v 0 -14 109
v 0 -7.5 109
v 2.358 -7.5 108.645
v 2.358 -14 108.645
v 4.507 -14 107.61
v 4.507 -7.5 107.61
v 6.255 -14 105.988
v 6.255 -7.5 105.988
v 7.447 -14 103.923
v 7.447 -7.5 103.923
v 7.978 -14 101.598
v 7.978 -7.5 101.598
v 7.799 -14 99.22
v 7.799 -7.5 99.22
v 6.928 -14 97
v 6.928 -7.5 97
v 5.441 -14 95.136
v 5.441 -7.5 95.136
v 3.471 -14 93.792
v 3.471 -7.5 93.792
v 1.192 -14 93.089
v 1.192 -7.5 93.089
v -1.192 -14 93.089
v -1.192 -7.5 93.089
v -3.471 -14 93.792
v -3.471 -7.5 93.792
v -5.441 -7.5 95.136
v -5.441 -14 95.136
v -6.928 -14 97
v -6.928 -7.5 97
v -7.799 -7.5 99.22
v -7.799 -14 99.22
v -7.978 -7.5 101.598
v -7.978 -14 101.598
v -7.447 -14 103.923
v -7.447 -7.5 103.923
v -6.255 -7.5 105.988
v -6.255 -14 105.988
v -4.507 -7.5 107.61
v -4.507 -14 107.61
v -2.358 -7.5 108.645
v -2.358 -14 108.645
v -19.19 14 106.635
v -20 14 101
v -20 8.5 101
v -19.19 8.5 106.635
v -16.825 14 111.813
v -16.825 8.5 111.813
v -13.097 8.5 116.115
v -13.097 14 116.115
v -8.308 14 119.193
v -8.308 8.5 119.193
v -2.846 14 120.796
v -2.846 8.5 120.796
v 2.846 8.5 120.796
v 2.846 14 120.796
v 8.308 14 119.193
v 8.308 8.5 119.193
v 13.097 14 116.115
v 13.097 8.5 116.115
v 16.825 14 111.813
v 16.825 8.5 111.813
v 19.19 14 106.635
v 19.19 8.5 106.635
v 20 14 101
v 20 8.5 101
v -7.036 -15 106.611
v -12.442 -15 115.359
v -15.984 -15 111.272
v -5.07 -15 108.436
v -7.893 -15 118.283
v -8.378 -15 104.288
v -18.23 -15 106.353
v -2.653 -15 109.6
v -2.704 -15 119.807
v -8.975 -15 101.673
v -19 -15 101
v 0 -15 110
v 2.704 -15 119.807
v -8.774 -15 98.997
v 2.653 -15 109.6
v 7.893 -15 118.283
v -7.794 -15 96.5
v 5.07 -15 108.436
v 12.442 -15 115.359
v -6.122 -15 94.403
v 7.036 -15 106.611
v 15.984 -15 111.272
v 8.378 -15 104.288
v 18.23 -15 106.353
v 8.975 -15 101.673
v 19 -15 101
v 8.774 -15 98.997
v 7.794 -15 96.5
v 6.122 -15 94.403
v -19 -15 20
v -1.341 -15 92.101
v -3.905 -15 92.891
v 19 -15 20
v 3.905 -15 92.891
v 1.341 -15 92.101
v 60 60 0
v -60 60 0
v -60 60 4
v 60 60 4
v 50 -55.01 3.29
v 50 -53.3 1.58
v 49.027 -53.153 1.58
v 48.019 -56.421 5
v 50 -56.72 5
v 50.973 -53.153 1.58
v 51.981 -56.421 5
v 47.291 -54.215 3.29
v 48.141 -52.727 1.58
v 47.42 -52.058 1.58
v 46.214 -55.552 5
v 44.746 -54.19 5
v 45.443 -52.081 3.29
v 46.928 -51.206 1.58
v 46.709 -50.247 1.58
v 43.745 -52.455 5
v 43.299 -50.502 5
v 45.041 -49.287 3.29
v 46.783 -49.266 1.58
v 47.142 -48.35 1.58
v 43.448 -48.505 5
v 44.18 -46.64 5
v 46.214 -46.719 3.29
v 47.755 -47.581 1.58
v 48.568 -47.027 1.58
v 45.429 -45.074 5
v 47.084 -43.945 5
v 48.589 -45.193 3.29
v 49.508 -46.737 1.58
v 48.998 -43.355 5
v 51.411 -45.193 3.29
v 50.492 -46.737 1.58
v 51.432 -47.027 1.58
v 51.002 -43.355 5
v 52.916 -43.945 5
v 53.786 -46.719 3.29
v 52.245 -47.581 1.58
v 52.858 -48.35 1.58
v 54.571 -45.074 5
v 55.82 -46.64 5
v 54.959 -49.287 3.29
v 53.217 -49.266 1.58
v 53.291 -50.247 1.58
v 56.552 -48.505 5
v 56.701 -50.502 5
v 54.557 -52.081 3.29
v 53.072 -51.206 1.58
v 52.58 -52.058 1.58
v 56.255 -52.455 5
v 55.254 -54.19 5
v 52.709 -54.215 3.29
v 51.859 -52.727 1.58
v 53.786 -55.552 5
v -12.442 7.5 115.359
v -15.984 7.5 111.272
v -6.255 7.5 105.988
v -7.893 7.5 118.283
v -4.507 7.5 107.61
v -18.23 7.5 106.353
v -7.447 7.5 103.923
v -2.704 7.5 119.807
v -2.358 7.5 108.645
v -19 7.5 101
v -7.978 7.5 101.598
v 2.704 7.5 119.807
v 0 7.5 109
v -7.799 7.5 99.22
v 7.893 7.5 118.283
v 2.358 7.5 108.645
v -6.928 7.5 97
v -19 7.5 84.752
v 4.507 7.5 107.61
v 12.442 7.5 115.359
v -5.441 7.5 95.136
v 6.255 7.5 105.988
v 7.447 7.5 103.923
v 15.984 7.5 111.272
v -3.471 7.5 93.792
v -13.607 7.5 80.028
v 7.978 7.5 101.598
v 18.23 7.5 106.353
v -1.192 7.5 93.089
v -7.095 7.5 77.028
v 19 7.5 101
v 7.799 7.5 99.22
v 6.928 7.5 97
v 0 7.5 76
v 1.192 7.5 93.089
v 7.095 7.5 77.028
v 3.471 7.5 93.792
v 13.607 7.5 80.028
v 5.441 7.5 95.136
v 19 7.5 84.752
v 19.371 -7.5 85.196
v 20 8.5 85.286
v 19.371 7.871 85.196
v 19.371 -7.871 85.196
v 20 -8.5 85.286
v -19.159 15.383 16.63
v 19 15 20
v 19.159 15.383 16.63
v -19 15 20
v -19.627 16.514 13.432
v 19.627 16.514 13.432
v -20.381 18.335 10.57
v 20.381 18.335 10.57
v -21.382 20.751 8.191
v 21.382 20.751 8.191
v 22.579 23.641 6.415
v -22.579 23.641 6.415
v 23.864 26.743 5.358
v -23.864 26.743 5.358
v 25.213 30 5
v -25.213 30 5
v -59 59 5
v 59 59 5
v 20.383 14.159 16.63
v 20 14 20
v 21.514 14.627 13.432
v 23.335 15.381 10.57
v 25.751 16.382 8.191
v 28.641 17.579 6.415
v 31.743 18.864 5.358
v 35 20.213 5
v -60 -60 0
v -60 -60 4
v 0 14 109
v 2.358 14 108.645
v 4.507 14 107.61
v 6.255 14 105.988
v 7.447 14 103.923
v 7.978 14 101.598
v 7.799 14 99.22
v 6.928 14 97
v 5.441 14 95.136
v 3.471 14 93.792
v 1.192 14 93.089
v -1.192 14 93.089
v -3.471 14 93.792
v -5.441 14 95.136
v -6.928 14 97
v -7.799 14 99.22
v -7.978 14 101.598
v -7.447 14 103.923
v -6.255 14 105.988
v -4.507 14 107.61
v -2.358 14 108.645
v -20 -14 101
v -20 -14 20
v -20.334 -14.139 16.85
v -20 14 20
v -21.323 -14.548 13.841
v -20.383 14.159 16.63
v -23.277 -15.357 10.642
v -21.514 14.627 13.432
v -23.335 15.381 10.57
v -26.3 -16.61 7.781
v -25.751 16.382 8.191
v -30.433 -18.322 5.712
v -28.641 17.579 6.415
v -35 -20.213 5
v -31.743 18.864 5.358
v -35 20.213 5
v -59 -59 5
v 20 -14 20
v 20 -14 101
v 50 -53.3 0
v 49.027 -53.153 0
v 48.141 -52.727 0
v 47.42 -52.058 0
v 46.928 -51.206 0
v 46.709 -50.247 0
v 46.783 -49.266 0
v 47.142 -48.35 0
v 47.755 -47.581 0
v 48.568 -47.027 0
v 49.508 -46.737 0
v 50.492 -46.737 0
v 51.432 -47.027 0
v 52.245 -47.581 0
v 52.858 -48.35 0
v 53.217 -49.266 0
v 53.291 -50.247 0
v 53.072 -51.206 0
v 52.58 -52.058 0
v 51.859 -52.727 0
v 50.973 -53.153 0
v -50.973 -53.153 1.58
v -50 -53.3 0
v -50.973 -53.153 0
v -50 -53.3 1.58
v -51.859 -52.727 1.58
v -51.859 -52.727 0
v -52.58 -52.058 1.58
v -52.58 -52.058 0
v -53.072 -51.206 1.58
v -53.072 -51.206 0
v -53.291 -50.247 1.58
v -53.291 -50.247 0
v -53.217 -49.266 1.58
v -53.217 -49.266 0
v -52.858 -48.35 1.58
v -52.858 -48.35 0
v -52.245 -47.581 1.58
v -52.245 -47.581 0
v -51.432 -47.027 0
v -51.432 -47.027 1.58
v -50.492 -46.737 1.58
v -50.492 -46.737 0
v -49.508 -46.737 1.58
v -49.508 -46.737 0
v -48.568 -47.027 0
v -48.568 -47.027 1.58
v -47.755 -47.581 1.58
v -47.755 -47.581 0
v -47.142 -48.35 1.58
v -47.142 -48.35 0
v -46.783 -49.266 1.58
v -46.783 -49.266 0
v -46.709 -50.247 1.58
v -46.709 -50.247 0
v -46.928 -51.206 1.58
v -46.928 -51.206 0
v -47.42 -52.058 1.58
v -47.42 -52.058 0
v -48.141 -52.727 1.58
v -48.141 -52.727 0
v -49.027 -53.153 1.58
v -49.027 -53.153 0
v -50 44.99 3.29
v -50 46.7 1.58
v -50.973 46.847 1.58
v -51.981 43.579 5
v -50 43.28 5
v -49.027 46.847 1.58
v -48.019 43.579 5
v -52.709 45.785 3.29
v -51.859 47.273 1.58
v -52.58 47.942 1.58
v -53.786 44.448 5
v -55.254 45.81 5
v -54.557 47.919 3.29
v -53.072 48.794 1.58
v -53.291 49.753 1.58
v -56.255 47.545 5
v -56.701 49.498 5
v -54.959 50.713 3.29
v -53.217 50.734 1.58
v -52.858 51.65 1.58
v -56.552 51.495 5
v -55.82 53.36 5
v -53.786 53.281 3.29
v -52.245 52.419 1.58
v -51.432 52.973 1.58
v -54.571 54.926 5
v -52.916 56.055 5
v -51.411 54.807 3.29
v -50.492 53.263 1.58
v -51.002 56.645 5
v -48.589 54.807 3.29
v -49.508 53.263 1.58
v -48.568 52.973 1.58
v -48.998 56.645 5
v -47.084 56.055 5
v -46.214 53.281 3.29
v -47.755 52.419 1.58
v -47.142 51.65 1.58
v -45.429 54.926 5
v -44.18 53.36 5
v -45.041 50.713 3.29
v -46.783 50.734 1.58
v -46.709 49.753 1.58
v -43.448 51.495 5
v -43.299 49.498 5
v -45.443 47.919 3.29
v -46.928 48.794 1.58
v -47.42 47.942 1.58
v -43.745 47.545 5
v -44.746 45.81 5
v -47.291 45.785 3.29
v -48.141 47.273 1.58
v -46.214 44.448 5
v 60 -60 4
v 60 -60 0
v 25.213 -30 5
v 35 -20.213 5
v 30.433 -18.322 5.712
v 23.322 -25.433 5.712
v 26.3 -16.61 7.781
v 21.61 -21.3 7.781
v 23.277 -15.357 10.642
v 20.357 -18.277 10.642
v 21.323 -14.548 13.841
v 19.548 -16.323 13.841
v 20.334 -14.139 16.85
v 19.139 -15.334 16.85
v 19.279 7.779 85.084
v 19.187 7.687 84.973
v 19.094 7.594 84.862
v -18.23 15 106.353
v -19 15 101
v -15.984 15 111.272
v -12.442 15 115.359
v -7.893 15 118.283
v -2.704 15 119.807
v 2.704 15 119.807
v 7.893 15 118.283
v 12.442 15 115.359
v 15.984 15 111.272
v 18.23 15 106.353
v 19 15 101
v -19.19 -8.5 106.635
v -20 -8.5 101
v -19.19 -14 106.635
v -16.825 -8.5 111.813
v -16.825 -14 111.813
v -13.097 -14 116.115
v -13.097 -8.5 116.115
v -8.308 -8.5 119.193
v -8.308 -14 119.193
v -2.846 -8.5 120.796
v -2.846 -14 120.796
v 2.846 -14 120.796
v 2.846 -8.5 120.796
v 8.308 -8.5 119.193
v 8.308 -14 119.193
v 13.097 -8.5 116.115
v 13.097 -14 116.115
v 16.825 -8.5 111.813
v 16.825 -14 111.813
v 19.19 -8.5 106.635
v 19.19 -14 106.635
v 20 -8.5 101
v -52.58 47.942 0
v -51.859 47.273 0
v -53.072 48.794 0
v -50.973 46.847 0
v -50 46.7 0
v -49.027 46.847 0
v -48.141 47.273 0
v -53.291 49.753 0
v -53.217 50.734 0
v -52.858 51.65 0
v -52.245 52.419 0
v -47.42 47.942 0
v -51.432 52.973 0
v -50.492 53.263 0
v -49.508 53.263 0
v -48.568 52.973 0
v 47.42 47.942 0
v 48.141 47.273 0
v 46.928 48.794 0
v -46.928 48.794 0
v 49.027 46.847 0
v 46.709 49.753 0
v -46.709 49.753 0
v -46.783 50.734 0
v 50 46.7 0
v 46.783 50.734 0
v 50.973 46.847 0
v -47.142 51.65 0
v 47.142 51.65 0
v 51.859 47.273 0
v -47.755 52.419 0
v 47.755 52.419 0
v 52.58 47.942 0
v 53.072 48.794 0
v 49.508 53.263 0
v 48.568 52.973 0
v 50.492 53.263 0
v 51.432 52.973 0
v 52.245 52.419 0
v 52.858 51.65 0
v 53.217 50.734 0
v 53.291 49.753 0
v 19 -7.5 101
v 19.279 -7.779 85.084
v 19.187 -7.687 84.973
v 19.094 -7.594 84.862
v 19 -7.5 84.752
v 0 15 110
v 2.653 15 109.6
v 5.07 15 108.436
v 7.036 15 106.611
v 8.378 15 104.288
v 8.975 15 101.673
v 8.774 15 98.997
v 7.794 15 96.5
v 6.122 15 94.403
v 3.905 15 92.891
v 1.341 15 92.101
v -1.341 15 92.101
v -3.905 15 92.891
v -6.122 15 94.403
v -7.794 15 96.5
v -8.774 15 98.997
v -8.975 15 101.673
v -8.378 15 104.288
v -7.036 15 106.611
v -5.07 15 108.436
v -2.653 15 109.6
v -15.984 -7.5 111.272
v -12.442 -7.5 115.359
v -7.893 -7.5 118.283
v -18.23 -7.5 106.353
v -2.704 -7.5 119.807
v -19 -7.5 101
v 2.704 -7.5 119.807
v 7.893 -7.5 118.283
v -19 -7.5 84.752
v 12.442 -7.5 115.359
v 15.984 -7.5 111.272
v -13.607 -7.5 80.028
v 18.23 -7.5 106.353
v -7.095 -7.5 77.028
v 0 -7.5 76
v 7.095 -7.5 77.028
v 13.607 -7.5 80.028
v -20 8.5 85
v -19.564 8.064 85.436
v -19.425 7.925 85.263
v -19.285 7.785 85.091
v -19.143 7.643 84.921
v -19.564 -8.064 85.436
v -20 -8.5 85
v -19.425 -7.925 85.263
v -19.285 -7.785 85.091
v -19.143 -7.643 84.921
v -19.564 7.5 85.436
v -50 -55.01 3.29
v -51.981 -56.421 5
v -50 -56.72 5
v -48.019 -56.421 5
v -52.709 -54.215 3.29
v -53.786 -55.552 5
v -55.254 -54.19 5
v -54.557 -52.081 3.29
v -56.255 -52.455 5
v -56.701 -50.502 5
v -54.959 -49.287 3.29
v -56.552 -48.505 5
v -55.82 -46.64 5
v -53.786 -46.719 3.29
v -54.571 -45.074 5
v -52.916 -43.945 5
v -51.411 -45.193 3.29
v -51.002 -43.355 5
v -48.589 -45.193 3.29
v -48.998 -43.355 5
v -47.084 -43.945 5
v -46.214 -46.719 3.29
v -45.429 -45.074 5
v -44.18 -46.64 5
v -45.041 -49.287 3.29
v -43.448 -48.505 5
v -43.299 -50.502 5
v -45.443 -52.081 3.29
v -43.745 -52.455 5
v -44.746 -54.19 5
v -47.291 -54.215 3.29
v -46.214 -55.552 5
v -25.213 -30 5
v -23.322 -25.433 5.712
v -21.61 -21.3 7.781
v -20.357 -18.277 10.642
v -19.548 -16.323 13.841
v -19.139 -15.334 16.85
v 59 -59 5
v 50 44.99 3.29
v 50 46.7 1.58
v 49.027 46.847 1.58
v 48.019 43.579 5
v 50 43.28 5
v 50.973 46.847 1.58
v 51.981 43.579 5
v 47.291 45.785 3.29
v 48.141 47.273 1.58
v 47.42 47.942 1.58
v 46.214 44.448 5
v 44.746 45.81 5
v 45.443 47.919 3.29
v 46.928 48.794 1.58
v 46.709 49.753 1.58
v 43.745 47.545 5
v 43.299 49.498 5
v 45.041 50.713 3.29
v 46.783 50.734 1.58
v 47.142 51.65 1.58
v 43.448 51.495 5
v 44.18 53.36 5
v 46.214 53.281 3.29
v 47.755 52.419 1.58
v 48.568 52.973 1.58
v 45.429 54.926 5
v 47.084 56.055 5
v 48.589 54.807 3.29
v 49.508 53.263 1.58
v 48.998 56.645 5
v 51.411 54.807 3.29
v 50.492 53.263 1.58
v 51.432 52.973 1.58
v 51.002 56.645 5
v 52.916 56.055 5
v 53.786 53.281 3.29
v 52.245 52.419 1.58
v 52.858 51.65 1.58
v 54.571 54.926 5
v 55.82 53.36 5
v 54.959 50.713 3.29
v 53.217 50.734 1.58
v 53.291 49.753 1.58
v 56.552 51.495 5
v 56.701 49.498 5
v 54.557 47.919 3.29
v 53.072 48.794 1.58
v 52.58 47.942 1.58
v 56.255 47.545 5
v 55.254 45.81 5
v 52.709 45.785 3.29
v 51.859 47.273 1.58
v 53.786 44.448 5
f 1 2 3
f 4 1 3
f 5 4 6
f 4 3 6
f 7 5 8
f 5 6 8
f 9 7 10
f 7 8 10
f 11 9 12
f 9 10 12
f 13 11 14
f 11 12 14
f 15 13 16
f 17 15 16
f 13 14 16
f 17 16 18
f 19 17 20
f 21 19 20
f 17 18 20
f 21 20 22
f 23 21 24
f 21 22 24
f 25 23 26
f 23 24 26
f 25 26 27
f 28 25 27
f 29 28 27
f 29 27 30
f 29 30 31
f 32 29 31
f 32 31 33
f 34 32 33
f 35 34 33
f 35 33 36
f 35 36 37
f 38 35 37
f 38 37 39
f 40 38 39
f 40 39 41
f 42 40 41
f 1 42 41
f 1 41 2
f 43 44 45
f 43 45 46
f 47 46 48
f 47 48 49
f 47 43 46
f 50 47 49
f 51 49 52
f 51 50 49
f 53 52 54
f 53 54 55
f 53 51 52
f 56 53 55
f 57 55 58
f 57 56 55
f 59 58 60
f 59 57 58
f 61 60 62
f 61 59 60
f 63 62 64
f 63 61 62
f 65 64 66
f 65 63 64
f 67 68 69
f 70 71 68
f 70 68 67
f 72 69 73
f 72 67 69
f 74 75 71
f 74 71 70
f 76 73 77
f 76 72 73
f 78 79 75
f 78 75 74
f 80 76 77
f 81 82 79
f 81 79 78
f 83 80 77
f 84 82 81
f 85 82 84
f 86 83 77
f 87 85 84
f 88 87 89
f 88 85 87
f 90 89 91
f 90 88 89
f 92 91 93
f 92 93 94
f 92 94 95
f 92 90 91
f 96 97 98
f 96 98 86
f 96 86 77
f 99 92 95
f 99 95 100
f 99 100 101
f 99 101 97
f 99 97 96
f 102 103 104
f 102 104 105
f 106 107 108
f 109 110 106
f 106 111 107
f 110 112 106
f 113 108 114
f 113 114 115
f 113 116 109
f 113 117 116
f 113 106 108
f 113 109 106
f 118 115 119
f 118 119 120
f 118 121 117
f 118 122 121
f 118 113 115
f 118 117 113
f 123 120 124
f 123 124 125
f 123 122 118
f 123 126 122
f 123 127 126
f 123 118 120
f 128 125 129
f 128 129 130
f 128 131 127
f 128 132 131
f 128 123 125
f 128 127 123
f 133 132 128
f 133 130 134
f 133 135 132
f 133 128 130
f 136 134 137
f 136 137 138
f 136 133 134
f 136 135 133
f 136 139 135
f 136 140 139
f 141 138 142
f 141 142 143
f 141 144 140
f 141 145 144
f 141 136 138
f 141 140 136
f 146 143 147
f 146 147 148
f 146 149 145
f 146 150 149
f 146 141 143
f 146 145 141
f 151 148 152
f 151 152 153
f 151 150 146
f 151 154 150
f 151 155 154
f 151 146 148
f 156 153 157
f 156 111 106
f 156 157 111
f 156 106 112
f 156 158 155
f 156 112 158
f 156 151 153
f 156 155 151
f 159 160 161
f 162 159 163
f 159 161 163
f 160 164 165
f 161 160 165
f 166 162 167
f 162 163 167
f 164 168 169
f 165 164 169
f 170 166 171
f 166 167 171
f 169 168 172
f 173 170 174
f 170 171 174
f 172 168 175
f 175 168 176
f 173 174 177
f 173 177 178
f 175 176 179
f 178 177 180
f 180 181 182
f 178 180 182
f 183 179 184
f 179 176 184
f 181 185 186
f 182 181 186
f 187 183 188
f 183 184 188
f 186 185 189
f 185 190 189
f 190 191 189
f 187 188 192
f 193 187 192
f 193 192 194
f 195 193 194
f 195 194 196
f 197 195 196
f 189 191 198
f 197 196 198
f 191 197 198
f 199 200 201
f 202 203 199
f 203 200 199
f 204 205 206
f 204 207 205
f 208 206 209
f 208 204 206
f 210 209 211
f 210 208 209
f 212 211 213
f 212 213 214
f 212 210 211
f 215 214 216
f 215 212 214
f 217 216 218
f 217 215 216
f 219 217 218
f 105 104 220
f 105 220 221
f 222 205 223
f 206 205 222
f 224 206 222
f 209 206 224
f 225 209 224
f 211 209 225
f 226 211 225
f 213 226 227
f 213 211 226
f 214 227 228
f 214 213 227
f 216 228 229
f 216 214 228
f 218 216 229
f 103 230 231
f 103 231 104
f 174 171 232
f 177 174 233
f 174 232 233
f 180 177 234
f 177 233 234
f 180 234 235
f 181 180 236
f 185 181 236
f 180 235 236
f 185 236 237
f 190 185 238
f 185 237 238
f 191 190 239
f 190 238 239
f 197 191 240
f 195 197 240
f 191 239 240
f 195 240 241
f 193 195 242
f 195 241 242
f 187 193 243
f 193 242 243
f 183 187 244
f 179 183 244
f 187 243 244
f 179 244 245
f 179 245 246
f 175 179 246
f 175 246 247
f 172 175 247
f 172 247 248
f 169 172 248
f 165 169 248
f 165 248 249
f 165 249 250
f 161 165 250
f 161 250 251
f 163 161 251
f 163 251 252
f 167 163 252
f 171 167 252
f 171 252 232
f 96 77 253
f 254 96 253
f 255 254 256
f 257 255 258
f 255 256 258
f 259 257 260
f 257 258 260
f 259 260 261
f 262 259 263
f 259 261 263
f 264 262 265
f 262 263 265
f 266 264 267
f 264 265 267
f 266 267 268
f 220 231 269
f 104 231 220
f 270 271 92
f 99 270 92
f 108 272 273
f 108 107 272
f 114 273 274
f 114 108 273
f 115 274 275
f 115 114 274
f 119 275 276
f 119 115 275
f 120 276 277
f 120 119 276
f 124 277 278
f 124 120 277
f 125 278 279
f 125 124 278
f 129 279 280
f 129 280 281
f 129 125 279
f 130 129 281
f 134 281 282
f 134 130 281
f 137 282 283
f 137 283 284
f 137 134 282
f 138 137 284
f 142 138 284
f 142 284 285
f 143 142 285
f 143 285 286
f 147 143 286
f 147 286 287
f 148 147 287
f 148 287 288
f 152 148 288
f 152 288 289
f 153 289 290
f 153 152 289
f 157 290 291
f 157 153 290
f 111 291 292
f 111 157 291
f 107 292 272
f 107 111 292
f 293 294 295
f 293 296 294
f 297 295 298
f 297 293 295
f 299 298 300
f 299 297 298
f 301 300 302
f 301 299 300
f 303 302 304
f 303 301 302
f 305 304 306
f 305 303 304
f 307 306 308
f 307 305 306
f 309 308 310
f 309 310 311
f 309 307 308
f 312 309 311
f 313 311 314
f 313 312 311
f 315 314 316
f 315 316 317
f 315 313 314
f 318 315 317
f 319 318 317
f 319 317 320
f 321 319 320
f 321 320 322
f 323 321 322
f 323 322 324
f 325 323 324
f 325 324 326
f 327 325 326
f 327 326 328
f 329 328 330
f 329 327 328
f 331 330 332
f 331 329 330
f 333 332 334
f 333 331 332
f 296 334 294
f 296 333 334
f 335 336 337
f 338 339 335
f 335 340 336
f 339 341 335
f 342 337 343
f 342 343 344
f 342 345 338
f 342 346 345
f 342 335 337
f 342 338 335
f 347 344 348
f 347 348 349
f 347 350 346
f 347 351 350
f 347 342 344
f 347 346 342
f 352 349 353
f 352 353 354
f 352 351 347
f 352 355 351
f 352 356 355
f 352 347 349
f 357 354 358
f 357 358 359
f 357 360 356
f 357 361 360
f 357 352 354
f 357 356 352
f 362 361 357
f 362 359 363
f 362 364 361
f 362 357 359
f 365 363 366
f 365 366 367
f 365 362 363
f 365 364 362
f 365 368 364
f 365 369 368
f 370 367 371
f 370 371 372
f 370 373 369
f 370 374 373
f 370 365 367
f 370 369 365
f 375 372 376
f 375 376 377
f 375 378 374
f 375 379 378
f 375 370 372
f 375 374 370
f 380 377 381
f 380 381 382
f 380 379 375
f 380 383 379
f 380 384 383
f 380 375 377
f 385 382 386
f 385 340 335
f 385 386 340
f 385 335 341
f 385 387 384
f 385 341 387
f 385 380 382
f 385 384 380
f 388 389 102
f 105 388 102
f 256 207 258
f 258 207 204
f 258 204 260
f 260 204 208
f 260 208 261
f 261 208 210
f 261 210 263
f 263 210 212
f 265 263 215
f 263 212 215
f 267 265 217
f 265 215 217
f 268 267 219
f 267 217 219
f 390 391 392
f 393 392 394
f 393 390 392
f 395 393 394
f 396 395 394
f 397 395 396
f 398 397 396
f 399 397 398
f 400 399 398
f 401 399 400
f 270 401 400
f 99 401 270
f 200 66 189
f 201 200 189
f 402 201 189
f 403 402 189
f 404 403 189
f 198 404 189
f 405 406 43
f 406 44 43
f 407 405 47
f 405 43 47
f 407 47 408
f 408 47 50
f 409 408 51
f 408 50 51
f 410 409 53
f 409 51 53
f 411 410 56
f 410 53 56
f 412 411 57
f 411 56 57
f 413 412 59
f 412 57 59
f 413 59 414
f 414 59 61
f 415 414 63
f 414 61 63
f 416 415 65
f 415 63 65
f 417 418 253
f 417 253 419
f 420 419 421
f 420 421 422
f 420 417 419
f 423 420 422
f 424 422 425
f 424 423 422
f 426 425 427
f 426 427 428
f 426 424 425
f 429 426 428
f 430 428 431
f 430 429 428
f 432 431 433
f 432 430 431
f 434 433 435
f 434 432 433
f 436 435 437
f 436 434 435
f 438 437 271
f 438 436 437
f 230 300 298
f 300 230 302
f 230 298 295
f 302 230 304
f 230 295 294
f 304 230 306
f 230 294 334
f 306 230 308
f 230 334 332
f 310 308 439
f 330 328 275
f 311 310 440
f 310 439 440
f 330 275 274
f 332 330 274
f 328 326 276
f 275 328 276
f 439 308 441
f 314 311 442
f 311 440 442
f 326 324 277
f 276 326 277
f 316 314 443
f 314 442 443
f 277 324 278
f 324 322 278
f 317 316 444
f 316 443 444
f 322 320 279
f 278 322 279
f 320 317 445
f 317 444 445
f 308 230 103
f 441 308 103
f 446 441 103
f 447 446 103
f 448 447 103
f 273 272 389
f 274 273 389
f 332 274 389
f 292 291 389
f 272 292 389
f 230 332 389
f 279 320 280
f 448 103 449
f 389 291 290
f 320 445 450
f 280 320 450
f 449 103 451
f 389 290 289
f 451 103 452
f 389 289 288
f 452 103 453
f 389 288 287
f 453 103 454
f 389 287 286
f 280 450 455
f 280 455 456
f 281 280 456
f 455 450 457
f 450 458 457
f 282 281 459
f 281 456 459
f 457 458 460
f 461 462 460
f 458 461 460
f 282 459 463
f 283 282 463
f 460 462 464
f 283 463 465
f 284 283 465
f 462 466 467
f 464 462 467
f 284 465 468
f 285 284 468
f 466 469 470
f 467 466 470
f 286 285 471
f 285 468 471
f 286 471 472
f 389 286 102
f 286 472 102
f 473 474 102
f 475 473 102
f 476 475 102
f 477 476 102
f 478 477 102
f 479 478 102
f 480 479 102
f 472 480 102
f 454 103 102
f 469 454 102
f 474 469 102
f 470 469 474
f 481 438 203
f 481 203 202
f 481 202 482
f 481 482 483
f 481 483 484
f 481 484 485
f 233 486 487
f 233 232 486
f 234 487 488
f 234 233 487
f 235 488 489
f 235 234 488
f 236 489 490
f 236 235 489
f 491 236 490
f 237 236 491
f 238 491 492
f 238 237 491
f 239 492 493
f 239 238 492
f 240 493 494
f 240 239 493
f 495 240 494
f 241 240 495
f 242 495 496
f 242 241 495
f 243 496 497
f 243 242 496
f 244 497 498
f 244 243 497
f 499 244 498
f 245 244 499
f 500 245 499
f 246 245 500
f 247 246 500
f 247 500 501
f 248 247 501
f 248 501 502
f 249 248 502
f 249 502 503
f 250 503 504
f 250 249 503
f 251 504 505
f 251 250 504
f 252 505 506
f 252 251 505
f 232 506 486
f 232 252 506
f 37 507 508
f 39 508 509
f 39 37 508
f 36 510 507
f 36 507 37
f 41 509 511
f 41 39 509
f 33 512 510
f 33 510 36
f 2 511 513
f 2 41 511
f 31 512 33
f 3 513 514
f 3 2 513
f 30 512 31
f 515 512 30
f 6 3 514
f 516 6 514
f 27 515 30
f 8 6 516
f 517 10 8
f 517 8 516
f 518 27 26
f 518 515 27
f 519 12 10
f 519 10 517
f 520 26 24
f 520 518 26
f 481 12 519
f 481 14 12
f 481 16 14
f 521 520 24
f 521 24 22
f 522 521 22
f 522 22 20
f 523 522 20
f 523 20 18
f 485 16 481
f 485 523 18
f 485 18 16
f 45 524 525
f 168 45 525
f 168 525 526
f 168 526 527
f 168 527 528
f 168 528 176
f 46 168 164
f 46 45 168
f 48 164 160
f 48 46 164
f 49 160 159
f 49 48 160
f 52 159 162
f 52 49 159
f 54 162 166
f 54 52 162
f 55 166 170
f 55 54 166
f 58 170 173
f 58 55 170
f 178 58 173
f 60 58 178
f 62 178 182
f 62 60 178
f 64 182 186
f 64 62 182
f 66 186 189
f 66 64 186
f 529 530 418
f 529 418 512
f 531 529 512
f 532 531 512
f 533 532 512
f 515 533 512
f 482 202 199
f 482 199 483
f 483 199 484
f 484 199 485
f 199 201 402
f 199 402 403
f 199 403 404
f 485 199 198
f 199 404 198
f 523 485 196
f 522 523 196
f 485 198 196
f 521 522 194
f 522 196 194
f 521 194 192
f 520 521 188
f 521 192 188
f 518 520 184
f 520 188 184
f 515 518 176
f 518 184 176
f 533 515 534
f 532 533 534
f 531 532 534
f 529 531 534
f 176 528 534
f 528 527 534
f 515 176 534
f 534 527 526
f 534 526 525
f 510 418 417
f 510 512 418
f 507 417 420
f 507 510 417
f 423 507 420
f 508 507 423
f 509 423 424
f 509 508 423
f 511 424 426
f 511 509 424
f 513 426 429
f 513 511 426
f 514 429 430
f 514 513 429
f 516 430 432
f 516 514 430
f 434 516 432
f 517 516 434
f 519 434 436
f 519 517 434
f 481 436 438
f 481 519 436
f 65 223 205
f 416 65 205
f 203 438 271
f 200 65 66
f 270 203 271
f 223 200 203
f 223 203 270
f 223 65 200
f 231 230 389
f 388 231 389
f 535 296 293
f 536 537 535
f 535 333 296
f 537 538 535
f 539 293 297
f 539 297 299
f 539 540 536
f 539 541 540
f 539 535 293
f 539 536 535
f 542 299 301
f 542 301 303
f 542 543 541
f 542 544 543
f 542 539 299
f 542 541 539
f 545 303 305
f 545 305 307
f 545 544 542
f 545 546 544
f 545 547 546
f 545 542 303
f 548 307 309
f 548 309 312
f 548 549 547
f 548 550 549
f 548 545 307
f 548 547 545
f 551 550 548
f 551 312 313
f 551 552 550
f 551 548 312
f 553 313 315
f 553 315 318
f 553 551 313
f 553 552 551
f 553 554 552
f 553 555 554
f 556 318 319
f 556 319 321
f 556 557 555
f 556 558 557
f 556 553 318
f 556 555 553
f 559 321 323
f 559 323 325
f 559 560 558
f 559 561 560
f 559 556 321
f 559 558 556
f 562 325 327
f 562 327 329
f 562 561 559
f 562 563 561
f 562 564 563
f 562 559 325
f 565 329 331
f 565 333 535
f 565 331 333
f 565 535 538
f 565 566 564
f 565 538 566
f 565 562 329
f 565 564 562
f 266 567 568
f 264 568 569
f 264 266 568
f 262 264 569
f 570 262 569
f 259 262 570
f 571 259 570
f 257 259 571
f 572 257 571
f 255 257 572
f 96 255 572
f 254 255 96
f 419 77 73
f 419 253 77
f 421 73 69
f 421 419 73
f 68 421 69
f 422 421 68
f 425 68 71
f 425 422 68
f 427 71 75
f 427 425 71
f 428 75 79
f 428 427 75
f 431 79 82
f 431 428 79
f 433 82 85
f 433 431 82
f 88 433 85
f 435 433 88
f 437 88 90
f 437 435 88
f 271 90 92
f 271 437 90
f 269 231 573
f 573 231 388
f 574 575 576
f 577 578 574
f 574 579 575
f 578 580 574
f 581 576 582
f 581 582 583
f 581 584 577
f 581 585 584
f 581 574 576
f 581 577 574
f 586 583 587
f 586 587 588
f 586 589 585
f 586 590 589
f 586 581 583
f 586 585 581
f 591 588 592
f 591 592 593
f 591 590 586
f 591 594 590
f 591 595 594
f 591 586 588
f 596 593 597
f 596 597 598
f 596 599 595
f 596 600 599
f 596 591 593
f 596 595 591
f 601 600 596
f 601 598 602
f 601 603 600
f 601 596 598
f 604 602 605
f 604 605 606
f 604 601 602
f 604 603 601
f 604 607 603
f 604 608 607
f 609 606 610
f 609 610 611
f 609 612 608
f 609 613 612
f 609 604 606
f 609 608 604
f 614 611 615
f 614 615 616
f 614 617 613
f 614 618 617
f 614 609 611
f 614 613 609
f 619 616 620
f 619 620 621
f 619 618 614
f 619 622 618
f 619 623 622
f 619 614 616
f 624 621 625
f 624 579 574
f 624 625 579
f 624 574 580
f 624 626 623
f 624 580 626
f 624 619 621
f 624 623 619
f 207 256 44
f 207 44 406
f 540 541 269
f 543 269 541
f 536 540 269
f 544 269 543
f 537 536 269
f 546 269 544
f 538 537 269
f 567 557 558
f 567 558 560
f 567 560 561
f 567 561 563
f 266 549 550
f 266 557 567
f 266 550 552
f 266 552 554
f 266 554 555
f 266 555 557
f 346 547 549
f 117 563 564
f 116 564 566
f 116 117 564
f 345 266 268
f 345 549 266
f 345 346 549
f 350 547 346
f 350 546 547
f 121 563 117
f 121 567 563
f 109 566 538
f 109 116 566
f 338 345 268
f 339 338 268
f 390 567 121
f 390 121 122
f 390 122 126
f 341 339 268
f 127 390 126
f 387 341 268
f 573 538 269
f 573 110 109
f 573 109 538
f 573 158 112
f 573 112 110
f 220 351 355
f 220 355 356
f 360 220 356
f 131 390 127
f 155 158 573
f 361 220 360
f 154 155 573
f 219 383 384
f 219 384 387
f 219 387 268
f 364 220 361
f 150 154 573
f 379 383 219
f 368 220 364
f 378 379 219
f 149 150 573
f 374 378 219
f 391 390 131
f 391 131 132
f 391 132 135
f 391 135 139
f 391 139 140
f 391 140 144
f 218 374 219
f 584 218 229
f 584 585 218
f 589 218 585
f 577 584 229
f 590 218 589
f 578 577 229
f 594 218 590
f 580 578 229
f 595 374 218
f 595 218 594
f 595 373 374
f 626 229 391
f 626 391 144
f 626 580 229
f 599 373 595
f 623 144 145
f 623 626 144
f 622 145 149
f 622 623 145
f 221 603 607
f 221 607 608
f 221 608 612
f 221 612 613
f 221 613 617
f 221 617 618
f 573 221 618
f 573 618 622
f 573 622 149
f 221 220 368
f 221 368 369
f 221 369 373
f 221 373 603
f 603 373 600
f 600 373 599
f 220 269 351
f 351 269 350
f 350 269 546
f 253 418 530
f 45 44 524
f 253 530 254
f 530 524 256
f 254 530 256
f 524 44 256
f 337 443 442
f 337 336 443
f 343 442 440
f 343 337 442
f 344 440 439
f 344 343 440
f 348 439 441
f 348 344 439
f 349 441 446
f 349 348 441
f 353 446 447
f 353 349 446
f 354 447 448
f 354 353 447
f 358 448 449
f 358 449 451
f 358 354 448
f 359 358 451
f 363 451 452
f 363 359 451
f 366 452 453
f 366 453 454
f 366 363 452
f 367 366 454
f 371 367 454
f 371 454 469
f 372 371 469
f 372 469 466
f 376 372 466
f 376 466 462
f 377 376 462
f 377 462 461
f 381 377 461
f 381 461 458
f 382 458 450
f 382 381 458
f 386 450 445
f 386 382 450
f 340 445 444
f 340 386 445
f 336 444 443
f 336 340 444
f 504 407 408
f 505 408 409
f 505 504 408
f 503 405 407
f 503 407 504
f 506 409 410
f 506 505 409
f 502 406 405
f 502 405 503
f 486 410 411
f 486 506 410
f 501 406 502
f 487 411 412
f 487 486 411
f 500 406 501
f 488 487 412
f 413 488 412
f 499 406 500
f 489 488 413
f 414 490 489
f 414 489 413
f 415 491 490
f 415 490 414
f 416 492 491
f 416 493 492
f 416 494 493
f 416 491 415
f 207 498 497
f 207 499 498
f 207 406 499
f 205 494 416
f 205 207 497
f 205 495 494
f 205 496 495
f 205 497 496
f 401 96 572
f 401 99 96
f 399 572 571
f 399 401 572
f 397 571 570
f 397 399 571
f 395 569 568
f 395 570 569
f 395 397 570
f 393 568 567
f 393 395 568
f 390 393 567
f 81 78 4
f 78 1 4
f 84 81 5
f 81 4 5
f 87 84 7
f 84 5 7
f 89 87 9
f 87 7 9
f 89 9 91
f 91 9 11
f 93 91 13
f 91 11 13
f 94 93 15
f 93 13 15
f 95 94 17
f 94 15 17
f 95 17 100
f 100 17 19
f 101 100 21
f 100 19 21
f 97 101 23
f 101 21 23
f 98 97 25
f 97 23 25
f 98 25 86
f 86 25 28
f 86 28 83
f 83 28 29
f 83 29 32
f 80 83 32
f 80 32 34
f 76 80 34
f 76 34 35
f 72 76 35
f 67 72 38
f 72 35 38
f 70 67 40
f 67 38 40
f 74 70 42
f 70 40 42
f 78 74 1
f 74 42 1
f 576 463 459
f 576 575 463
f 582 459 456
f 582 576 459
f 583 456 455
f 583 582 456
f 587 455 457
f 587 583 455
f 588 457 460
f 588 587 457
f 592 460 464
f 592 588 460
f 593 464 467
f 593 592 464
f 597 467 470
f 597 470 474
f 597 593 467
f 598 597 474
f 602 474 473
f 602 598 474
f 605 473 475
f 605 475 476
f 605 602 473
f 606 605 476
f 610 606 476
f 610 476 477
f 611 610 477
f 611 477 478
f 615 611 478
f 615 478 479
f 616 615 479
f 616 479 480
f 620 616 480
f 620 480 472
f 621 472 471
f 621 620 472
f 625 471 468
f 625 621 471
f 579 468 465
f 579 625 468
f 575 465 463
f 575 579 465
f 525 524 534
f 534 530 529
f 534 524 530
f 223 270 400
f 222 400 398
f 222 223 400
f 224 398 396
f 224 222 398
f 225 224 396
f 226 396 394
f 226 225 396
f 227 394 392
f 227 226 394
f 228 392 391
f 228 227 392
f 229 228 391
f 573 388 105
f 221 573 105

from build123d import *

# Parameters (mm, degrees)
SKETCH1_W                    = 120
SKETCH1_H                    = 120
BOSS_EXTRUDE1_DEPTH          = 5
CSK_FOR_M6_SFHCS1_AT_2_COUNT = 2
CSK_FOR_M6_SFHCS1_AT_2_PITCH = 100
CSK_FOR_M6_SFHCS1_AT_3_COUNT = 2
CSK_FOR_M6_SFHCS1_AT_3_PITCH = 141.421356237
CSK_FOR_M6_SFHCS1_AT_4_COUNT = 2
CSK_FOR_M6_SFHCS1_AT_4_PITCH = 100
SKETCH5_W                    = 96
SKETCH5_H                    = 30
BOSS_EXTRUDE2_DEPTH          = 20
SKETCH6_R                    = 20
BOSS_EXTRUDE3_DEPTH          = 15
SKETCH7_R                    = 25
CUT_EXTRUDE2_DEPTH           = 7.5
SKETCH8_R                    = 8
CUT_EXTRUDE3_DEPTH           = 155.486245342
CHAMFER1_SIZE                = 1
CHAMFER1_SIZE_2              = 0.714285714
FILLET1_R                    = 15
CHAMFER2_SIZE                = 1


with BuildPart() as part:
    # Sketch1 → Boss-Extrude1 (new body)
    with BuildSketch(Plane.XY):
        Rectangle(SKETCH1_W, SKETCH1_H)
    extrude(amount=BOSS_EXTRUDE1_DEPTH)

    # Sketch4 → CSK for M6 SFHCS1 (revolve, cut)
    with BuildSketch(Plane(origin=(-50, 50, 5), x_dir=(0, -1, 0), z_dir=(1, 0, 0))):
        Polygon((0, 0), (0, 5), (3.3, 5), (3.3, 3.42), (6.72, 0), align=None)
    csk_for_m6_sfhcs1 = revolve(axis=Axis((-50, 50, 11.35), (0, 0, -1)), mode=Mode.SUBTRACT)

    # CSK for M6 SFHCS1 at 2: CSK for M6 SFHCS1 ×2
    with Locations(*[(i * CSK_FOR_M6_SFHCS1_AT_2_PITCH, 0, 0) for i in range(1, CSK_FOR_M6_SFHCS1_AT_2_COUNT)]):
        add(csk_for_m6_sfhcs1, mode=Mode.SUBTRACT)

    # CSK for M6 SFHCS1 at 3: CSK for M6 SFHCS1 ×2
    with Locations(*[Vector(0.7071067811865476, -0.7071067811865476, 0) * (i * CSK_FOR_M6_SFHCS1_AT_3_PITCH) for i in range(1, CSK_FOR_M6_SFHCS1_AT_3_COUNT)]):
        add(csk_for_m6_sfhcs1, mode=Mode.SUBTRACT)

    # CSK for M6 SFHCS1 at 4: CSK for M6 SFHCS1 ×2
    with Locations(*[(0, -i * CSK_FOR_M6_SFHCS1_AT_4_PITCH, 0) for i in range(1, CSK_FOR_M6_SFHCS1_AT_4_COUNT)]):
        add(csk_for_m6_sfhcs1, mode=Mode.SUBTRACT)

    # Sketch5 → Boss-Extrude2 (add, symmetric)
    with BuildSketch(Plane(origin=(0, 0, 0), x_dir=(0, 0, -1), z_dir=(1, 0, 0))):
        with Locations((-53, 0)):
            Rectangle(SKETCH5_W, SKETCH5_H)
    extrude(amount=BOSS_EXTRUDE2_DEPTH, both=True)

    # Sketch6 → Boss-Extrude3 (add, symmetric)
    with BuildSketch(Plane(origin=(0, 0, 0), x_dir=(1, 0, 0), z_dir=(0, 1, 0))):
        with Locations((0, -101)):
            Circle(SKETCH6_R)
    extrude(amount=BOSS_EXTRUDE3_DEPTH, both=True)

    # Sketch7 → Cut-Extrude2 (cut, symmetric)
    with BuildSketch(Plane(origin=(0, 0, 0), x_dir=(1, 0, 0), z_dir=(0, 1, 0))):
        with Locations((0, -101)):
            Circle(SKETCH7_R)
    extrude(amount=CUT_EXTRUDE2_DEPTH, both=True, mode=Mode.SUBTRACT)

    # Sketch8 → Cut-Extrude3 (cut, through all)
    with BuildSketch(Plane(origin=(0, 15, 0), x_dir=(1, 0, 0), z_dir=(0, 1, 0))):
        with Locations(Location((0, -101, 0), (0, 0, 270))):
            Circle(SKETCH8_R)
    extrude(amount=-CUT_EXTRUDE3_DEPTH, mode=Mode.SUBTRACT)

    # Chamfer1
    # the kernel refuses this chamfer: 1, 0.714285714 mm, written as the material it takes off along each edge
    with BuildSketch(Plane(origin=(-20, 15, 5), x_dir=(0, -1, 0), z_dir=(0, 0, 1))) as chamfer1_piece_1:
        Polygon((CHAMFER1_SIZE, 0), (0, CHAMFER1_SIZE), (0, 0), align=None)
    extrude(amount=96, mode=Mode.SUBTRACT)
    with BuildSketch(Plane(origin=(-20, -15, 101), x_dir=(1, 0, 0), z_dir=(0, 0, -1)), Plane(origin=(20, 15, 5), x_dir=(0, -1, 0), z_dir=(0, 0, 1)), Plane(origin=(20, -15, 101), x_dir=(0, 1, 0), z_dir=(0, 0, -1))) as chamfer1_piece_2:
        Polygon((CHAMFER1_SIZE, 0), (0, -CHAMFER1_SIZE), (0, 0), align=None)
    extrude(amount=96, mode=Mode.SUBTRACT)
    with BuildSketch(Plane(origin=(0, -15, 101), x_dir=(-1, 0, 0), z_dir=(0, 0, -1))) as chamfer1_piece_3:
        Polygon((20 - CHAMFER1_SIZE, 0), (20, CHAMFER1_SIZE), (20, 0), align=None)
    revolve(axis=Axis((0, -15, 101), (0, 1, 0)), revolution_arc=180, mode=Mode.SUBTRACT)
    with BuildSketch(Plane(origin=(0, 15, 101), x_dir=(-1, 0, 0), z_dir=(0, 0, -1))) as chamfer1_piece_4:
        Polygon((20 - CHAMFER1_SIZE, 0), (20, -CHAMFER1_SIZE), (20, 0), align=None)
    revolve(axis=Axis((0, 15, 101), (0, 1, 0)), revolution_arc=180, mode=Mode.SUBTRACT)
    with BuildSketch(Plane(origin=(0, 7.5, 101), x_dir=(-1, 0, 0), z_dir=(0, 0, -1))) as chamfer1_piece_5:
        Polygon((20 - CHAMFER1_SIZE, 0), (20, CHAMFER1_SIZE), (20, 0), align=None)
    revolve(axis=Axis((0, 7.5, 101), (0, 1, 0)), revolution_arc=180, mode=Mode.SUBTRACT)
    with BuildSketch(Plane(origin=(0, -7.5, 101), x_dir=(-1, 0, 0), z_dir=(0, 0, -1))) as chamfer1_piece_6:
        Polygon((20, -CHAMFER1_SIZE), (20 - CHAMFER1_SIZE, 0), (20, 0), align=None)
    revolve(axis=Axis((0, -7.5, 101), (0, 1, 0)), revolution_arc=180, mode=Mode.SUBTRACT)
    with BuildSketch(Plane(origin=(-20, -7.5, 83.428317012), x_dir=(0, -1, 0), z_dir=(0, 0, 1))) as chamfer1_piece_7_section:
        Polygon((CHAMFER1_SIZE, 0), (0, CHAMFER1_SIZE), (0, 0), align=None)
    chamfer1_piece_7 = extrude(amount=17.571682988, mode=Mode.PRIVATE)
    chamfer1_piece_7 = chamfer1_piece_7 & Plane(origin=(0, -7.5, 101), x_dir=(1, 0, 0), z_dir=(0, 1, 0)) * Cylinder(25, 40, mode=Mode.PRIVATE)
    add(chamfer1_piece_7, mode=Mode.SUBTRACT)
    with BuildSketch(Plane(origin=(20, 7.5, 83.428317012), x_dir=(0, 1, 0), z_dir=(0, 0, 1))) as chamfer1_piece_8_section:
        Polygon((CHAMFER1_SIZE, 0), (0, CHAMFER1_SIZE), (0, 0), align=None)
    chamfer1_piece_8 = extrude(amount=17.571682988, mode=Mode.PRIVATE)
    chamfer1_piece_8 = chamfer1_piece_8 & Plane(origin=(0, 7.5, 101), x_dir=(1, 0, 0), z_dir=(0, 1, 0)) * Cylinder(25, 40, mode=Mode.PRIVATE)
    add(chamfer1_piece_8, mode=Mode.SUBTRACT)
    with BuildSketch(Plane(origin=(20, -7.5, 83.428317012), x_dir=(0, -1, 0), z_dir=(0, 0, 1))) as chamfer1_piece_9_section:
        Polygon((CHAMFER1_SIZE, 0), (0, -CHAMFER1_SIZE), (0, 0), align=None)
    chamfer1_piece_9 = extrude(amount=17.571682988, mode=Mode.PRIVATE)
    chamfer1_piece_9 = chamfer1_piece_9 & Plane(origin=(0, -7.5, 101), x_dir=(1, 0, 0), z_dir=(0, 1, 0)) * Cylinder(25, 40, mode=Mode.PRIVATE)
    add(chamfer1_piece_9, mode=Mode.SUBTRACT)
    with BuildSketch(Plane(origin=(-20, 7.5, 83.428317012), x_dir=(0, 1, 0), z_dir=(0, 0, 1))) as chamfer1_piece_10_section:
        Polygon((CHAMFER1_SIZE, 0), (0, -CHAMFER1_SIZE), (0, 0), align=None)
    chamfer1_piece_10 = extrude(amount=17.571682988, mode=Mode.PRIVATE)
    chamfer1_piece_10 = chamfer1_piece_10 & Plane(origin=(0, 7.5, 101), x_dir=(1, 0, 0), z_dir=(0, 1, 0)) * Cylinder(25, 40, mode=Mode.PRIVATE)
    add(chamfer1_piece_10, mode=Mode.SUBTRACT)
    with BuildSketch(Plane(origin=(0, -15, 101), x_dir=(0, 0, 1), z_dir=(-1, 0, 0))) as chamfer1_piece_11:
        Polygon((8 + CHAMFER1_SIZE, 0), (8, CHAMFER1_SIZE), (8, 0), align=None)
    revolve(axis=Axis((0, -15, 101), (0, 1, 0)), mode=Mode.SUBTRACT)
    with BuildSketch(Plane(origin=(0, 15, 101), x_dir=(0, 0, 1), z_dir=(-1, 0, 0))) as chamfer1_piece_12:
        Polygon((8 + CHAMFER1_SIZE, 0), (8, -CHAMFER1_SIZE), (8, 0), align=None)
    revolve(axis=Axis((0, 15, 101), (0, 1, 0)), mode=Mode.SUBTRACT)
    with BuildSketch(Plane(origin=(-20, -7.5, 86), x_dir=(0, 0, -1), z_dir=(0, 1, 0))) as chamfer1_piece_13:
        with BuildLine():
            Line((CHAMFER1_SIZE, 0), (0.56416807, -0.43583193))
            ThreePointArc((0.56416807, -0.43583193), (0.281621078, -0.214347187), (0, 0))
            Line((0, 0), (CHAMFER1_SIZE, 0))
        make_face()
    extrude(amount=15, mode=Mode.SUBTRACT)
    with BuildSketch(Plane(origin=(20, -7.5, 86), x_dir=(0, 0, -1), z_dir=(0, 1, 0))) as chamfer1_piece_14:
        with BuildLine():
            Line((CHAMFER1_SIZE_2, 0), (0.80417029, 0.629192029))
            ThreePointArc((0.80417029, 0.629192029), (0.416667008, 0.319390803), (0, 0))
            Line((0, 0), (CHAMFER1_SIZE_2, 0))
        make_face()
    extrude(amount=15, mode=Mode.SUBTRACT)
    with BuildSketch(Plane(origin=(-20, -7.5, 83.428317012), x_dir=(0, -1, 0), z_dir=(0, 0, 1))) as chamfer1_piece_15a_section:
        Polygon((CHAMFER1_SIZE, 0), (0, CHAMFER1_SIZE), (0, 0), align=None)
    chamfer1_piece_15a = extrude(amount=17.571682988, mode=Mode.PRIVATE)
    chamfer1_piece_15a = chamfer1_piece_15a - Plane(origin=(0, -7.5, 101), x_dir=(1, 0, 0), z_dir=(0, 1, 0)) * Cylinder(25, 40, mode=Mode.PRIVATE)
    with BuildSketch(Plane(origin=(-20, -10.071682988, 86), x_dir=(0, 0, -1), z_dir=(0, 1, 0))) as chamfer1_piece_15b_section:
        with BuildLine():
            Line((CHAMFER1_SIZE, 0), (0.56416807, -0.43583193))
            ThreePointArc((0.56416807, -0.43583193), (0.281621078, -0.214347187), (0, 0))
            Line((0, 0), (CHAMFER1_SIZE, 0))
        make_face()
    chamfer1_piece_15b = extrude(amount=17.571682988, mode=Mode.PRIVATE)
    chamfer1_piece_15b = split(chamfer1_piece_15b, bisect_by=Plane(origin=(-20, -7.5, 86), z_dir=(0, -1, 0)), keep=Keep.TOP, mode=Mode.PRIVATE)
    chamfer1_piece_15 = chamfer1_piece_15a & chamfer1_piece_15b
    add(chamfer1_piece_15, mode=Mode.SUBTRACT)
    with BuildSketch(Plane(origin=(20, -7.5, 86), x_dir=(0, 0, -1), z_dir=(0, 1, 0))) as chamfer1_piece_16a_section:
        with BuildLine():
            Line((CHAMFER1_SIZE_2, 0), (0.80417029, 0.629192029))
            ThreePointArc((0.80417029, 0.629192029), (0.416667008, 0.319390803), (0, 0))
            Line((0, 0), (CHAMFER1_SIZE_2, 0))
        make_face()
    chamfer1_piece_16a = extrude(amount=17.625714283, mode=Mode.PRIVATE)
    chamfer1_piece_16a = split(chamfer1_piece_16a, bisect_by=Plane(origin=(20, 7.5, 86), z_dir=(0, 1, 0)), keep=Keep.TOP, mode=Mode.PRIVATE)
    with BuildSketch(Plane(origin=(20, 7.5, 83.428317012), x_dir=(0, 1, 0), z_dir=(0, 0, 1))) as chamfer1_piece_16b_section:
        Polygon((CHAMFER1_SIZE, 0), (0, CHAMFER1_SIZE), (0, 0), align=None)
    chamfer1_piece_16b = extrude(amount=17.571682988, mode=Mode.PRIVATE)
    chamfer1_piece_16b = chamfer1_piece_16b - Plane(origin=(0, 7.5, 101), x_dir=(1, 0, 0), z_dir=(0, 1, 0)) * Cylinder(25, 40, mode=Mode.PRIVATE)
    chamfer1_piece_16 = chamfer1_piece_16a & chamfer1_piece_16b
    add(chamfer1_piece_16, mode=Mode.SUBTRACT)
    with BuildSketch(Plane(origin=(20, -7.5, 83.428317012), x_dir=(0, -1, 0), z_dir=(0, 0, 1))) as chamfer1_piece_17a_section:
        Polygon((CHAMFER1_SIZE, 0), (0, -CHAMFER1_SIZE), (0, 0), align=None)
    chamfer1_piece_17a = extrude(amount=17.571682988, mode=Mode.PRIVATE)
    chamfer1_piece_17a = chamfer1_piece_17a - Plane(origin=(0, -7.5, 101), x_dir=(1, 0, 0), z_dir=(0, 1, 0)) * Cylinder(25, 40, mode=Mode.PRIVATE)
    with BuildSketch(Plane(origin=(20, -10.125714283, 86), x_dir=(0, 0, -1), z_dir=(0, 1, 0))) as chamfer1_piece_17b_section:
        with BuildLine():
            Line((CHAMFER1_SIZE_2, 0), (0.80417029, 0.629192029))
            ThreePointArc((0.80417029, 0.629192029), (0.416667008, 0.319390803), (0, 0))
            Line((0, 0), (CHAMFER1_SIZE_2, 0))
        make_face()
    chamfer1_piece_17b = extrude(amount=17.625714283, mode=Mode.PRIVATE)
    chamfer1_piece_17b = split(chamfer1_piece_17b, bisect_by=Plane(origin=(20, -7.5, 86), z_dir=(0, -1, 0)), keep=Keep.TOP, mode=Mode.PRIVATE)
    chamfer1_piece_17 = chamfer1_piece_17a & chamfer1_piece_17b
    add(chamfer1_piece_17, mode=Mode.SUBTRACT)
    with BuildSketch(Plane(origin=(-20, -7.5, 86), x_dir=(0, 0, -1), z_dir=(0, 1, 0))) as chamfer1_piece_18a_section:
        with BuildLine():
            Line((CHAMFER1_SIZE, 0), (0.56416807, -0.43583193))
            ThreePointArc((0.56416807, -0.43583193), (0.281621078, -0.214347187), (0, 0))
            Line((0, 0), (CHAMFER1_SIZE, 0))
        make_face()
    chamfer1_piece_18a = extrude(amount=17.571682988, mode=Mode.PRIVATE)
    chamfer1_piece_18a = split(chamfer1_piece_18a, bisect_by=Plane(origin=(-20, 7.5, 86), z_dir=(0, 1, 0)), keep=Keep.TOP, mode=Mode.PRIVATE)
    with BuildSketch(Plane(origin=(-20, 7.5, 83.428317012), x_dir=(0, 1, 0), z_dir=(0, 0, 1))) as chamfer1_piece_18b_section:
        Polygon((CHAMFER1_SIZE, 0), (0, -CHAMFER1_SIZE), (0, 0), align=None)
    chamfer1_piece_18b = extrude(amount=17.571682988, mode=Mode.PRIVATE)
    chamfer1_piece_18b = chamfer1_piece_18b - Plane(origin=(0, 7.5, 101), x_dir=(1, 0, 0), z_dir=(0, 1, 0)) * Cylinder(25, 40, mode=Mode.PRIVATE)
    chamfer1_piece_18 = chamfer1_piece_18a & chamfer1_piece_18b
    add(chamfer1_piece_18, mode=Mode.SUBTRACT)

    # Fillet1
    fillet1_edges = [part.edges().sort_by_distance(p)[0] for p in [
        (-19.5, -14.5, 5),
        (19.5, -14.5, 5),
        (-19.5, 14.5, 5),
        (19.5, 14.5, 5),
        (20, 0, 5),
        (-20, 0, 5),
        (0, 15, 5),
        (0, -15, 5),
    ]]
    fillet(fillet1_edges, radius=FILLET1_R)

    # Chamfer2
    chamfer2_edges = [part.edges().sort_by_distance(p)[0] for p in [
        (60, 0, 5),
        (0, 60, 5),
        (-60, 0, 5),
        (0, -60, 5),
    ]]
    chamfer(chamfer2_edges, length=CHAMFER2_SIZE)


solid = part.part
